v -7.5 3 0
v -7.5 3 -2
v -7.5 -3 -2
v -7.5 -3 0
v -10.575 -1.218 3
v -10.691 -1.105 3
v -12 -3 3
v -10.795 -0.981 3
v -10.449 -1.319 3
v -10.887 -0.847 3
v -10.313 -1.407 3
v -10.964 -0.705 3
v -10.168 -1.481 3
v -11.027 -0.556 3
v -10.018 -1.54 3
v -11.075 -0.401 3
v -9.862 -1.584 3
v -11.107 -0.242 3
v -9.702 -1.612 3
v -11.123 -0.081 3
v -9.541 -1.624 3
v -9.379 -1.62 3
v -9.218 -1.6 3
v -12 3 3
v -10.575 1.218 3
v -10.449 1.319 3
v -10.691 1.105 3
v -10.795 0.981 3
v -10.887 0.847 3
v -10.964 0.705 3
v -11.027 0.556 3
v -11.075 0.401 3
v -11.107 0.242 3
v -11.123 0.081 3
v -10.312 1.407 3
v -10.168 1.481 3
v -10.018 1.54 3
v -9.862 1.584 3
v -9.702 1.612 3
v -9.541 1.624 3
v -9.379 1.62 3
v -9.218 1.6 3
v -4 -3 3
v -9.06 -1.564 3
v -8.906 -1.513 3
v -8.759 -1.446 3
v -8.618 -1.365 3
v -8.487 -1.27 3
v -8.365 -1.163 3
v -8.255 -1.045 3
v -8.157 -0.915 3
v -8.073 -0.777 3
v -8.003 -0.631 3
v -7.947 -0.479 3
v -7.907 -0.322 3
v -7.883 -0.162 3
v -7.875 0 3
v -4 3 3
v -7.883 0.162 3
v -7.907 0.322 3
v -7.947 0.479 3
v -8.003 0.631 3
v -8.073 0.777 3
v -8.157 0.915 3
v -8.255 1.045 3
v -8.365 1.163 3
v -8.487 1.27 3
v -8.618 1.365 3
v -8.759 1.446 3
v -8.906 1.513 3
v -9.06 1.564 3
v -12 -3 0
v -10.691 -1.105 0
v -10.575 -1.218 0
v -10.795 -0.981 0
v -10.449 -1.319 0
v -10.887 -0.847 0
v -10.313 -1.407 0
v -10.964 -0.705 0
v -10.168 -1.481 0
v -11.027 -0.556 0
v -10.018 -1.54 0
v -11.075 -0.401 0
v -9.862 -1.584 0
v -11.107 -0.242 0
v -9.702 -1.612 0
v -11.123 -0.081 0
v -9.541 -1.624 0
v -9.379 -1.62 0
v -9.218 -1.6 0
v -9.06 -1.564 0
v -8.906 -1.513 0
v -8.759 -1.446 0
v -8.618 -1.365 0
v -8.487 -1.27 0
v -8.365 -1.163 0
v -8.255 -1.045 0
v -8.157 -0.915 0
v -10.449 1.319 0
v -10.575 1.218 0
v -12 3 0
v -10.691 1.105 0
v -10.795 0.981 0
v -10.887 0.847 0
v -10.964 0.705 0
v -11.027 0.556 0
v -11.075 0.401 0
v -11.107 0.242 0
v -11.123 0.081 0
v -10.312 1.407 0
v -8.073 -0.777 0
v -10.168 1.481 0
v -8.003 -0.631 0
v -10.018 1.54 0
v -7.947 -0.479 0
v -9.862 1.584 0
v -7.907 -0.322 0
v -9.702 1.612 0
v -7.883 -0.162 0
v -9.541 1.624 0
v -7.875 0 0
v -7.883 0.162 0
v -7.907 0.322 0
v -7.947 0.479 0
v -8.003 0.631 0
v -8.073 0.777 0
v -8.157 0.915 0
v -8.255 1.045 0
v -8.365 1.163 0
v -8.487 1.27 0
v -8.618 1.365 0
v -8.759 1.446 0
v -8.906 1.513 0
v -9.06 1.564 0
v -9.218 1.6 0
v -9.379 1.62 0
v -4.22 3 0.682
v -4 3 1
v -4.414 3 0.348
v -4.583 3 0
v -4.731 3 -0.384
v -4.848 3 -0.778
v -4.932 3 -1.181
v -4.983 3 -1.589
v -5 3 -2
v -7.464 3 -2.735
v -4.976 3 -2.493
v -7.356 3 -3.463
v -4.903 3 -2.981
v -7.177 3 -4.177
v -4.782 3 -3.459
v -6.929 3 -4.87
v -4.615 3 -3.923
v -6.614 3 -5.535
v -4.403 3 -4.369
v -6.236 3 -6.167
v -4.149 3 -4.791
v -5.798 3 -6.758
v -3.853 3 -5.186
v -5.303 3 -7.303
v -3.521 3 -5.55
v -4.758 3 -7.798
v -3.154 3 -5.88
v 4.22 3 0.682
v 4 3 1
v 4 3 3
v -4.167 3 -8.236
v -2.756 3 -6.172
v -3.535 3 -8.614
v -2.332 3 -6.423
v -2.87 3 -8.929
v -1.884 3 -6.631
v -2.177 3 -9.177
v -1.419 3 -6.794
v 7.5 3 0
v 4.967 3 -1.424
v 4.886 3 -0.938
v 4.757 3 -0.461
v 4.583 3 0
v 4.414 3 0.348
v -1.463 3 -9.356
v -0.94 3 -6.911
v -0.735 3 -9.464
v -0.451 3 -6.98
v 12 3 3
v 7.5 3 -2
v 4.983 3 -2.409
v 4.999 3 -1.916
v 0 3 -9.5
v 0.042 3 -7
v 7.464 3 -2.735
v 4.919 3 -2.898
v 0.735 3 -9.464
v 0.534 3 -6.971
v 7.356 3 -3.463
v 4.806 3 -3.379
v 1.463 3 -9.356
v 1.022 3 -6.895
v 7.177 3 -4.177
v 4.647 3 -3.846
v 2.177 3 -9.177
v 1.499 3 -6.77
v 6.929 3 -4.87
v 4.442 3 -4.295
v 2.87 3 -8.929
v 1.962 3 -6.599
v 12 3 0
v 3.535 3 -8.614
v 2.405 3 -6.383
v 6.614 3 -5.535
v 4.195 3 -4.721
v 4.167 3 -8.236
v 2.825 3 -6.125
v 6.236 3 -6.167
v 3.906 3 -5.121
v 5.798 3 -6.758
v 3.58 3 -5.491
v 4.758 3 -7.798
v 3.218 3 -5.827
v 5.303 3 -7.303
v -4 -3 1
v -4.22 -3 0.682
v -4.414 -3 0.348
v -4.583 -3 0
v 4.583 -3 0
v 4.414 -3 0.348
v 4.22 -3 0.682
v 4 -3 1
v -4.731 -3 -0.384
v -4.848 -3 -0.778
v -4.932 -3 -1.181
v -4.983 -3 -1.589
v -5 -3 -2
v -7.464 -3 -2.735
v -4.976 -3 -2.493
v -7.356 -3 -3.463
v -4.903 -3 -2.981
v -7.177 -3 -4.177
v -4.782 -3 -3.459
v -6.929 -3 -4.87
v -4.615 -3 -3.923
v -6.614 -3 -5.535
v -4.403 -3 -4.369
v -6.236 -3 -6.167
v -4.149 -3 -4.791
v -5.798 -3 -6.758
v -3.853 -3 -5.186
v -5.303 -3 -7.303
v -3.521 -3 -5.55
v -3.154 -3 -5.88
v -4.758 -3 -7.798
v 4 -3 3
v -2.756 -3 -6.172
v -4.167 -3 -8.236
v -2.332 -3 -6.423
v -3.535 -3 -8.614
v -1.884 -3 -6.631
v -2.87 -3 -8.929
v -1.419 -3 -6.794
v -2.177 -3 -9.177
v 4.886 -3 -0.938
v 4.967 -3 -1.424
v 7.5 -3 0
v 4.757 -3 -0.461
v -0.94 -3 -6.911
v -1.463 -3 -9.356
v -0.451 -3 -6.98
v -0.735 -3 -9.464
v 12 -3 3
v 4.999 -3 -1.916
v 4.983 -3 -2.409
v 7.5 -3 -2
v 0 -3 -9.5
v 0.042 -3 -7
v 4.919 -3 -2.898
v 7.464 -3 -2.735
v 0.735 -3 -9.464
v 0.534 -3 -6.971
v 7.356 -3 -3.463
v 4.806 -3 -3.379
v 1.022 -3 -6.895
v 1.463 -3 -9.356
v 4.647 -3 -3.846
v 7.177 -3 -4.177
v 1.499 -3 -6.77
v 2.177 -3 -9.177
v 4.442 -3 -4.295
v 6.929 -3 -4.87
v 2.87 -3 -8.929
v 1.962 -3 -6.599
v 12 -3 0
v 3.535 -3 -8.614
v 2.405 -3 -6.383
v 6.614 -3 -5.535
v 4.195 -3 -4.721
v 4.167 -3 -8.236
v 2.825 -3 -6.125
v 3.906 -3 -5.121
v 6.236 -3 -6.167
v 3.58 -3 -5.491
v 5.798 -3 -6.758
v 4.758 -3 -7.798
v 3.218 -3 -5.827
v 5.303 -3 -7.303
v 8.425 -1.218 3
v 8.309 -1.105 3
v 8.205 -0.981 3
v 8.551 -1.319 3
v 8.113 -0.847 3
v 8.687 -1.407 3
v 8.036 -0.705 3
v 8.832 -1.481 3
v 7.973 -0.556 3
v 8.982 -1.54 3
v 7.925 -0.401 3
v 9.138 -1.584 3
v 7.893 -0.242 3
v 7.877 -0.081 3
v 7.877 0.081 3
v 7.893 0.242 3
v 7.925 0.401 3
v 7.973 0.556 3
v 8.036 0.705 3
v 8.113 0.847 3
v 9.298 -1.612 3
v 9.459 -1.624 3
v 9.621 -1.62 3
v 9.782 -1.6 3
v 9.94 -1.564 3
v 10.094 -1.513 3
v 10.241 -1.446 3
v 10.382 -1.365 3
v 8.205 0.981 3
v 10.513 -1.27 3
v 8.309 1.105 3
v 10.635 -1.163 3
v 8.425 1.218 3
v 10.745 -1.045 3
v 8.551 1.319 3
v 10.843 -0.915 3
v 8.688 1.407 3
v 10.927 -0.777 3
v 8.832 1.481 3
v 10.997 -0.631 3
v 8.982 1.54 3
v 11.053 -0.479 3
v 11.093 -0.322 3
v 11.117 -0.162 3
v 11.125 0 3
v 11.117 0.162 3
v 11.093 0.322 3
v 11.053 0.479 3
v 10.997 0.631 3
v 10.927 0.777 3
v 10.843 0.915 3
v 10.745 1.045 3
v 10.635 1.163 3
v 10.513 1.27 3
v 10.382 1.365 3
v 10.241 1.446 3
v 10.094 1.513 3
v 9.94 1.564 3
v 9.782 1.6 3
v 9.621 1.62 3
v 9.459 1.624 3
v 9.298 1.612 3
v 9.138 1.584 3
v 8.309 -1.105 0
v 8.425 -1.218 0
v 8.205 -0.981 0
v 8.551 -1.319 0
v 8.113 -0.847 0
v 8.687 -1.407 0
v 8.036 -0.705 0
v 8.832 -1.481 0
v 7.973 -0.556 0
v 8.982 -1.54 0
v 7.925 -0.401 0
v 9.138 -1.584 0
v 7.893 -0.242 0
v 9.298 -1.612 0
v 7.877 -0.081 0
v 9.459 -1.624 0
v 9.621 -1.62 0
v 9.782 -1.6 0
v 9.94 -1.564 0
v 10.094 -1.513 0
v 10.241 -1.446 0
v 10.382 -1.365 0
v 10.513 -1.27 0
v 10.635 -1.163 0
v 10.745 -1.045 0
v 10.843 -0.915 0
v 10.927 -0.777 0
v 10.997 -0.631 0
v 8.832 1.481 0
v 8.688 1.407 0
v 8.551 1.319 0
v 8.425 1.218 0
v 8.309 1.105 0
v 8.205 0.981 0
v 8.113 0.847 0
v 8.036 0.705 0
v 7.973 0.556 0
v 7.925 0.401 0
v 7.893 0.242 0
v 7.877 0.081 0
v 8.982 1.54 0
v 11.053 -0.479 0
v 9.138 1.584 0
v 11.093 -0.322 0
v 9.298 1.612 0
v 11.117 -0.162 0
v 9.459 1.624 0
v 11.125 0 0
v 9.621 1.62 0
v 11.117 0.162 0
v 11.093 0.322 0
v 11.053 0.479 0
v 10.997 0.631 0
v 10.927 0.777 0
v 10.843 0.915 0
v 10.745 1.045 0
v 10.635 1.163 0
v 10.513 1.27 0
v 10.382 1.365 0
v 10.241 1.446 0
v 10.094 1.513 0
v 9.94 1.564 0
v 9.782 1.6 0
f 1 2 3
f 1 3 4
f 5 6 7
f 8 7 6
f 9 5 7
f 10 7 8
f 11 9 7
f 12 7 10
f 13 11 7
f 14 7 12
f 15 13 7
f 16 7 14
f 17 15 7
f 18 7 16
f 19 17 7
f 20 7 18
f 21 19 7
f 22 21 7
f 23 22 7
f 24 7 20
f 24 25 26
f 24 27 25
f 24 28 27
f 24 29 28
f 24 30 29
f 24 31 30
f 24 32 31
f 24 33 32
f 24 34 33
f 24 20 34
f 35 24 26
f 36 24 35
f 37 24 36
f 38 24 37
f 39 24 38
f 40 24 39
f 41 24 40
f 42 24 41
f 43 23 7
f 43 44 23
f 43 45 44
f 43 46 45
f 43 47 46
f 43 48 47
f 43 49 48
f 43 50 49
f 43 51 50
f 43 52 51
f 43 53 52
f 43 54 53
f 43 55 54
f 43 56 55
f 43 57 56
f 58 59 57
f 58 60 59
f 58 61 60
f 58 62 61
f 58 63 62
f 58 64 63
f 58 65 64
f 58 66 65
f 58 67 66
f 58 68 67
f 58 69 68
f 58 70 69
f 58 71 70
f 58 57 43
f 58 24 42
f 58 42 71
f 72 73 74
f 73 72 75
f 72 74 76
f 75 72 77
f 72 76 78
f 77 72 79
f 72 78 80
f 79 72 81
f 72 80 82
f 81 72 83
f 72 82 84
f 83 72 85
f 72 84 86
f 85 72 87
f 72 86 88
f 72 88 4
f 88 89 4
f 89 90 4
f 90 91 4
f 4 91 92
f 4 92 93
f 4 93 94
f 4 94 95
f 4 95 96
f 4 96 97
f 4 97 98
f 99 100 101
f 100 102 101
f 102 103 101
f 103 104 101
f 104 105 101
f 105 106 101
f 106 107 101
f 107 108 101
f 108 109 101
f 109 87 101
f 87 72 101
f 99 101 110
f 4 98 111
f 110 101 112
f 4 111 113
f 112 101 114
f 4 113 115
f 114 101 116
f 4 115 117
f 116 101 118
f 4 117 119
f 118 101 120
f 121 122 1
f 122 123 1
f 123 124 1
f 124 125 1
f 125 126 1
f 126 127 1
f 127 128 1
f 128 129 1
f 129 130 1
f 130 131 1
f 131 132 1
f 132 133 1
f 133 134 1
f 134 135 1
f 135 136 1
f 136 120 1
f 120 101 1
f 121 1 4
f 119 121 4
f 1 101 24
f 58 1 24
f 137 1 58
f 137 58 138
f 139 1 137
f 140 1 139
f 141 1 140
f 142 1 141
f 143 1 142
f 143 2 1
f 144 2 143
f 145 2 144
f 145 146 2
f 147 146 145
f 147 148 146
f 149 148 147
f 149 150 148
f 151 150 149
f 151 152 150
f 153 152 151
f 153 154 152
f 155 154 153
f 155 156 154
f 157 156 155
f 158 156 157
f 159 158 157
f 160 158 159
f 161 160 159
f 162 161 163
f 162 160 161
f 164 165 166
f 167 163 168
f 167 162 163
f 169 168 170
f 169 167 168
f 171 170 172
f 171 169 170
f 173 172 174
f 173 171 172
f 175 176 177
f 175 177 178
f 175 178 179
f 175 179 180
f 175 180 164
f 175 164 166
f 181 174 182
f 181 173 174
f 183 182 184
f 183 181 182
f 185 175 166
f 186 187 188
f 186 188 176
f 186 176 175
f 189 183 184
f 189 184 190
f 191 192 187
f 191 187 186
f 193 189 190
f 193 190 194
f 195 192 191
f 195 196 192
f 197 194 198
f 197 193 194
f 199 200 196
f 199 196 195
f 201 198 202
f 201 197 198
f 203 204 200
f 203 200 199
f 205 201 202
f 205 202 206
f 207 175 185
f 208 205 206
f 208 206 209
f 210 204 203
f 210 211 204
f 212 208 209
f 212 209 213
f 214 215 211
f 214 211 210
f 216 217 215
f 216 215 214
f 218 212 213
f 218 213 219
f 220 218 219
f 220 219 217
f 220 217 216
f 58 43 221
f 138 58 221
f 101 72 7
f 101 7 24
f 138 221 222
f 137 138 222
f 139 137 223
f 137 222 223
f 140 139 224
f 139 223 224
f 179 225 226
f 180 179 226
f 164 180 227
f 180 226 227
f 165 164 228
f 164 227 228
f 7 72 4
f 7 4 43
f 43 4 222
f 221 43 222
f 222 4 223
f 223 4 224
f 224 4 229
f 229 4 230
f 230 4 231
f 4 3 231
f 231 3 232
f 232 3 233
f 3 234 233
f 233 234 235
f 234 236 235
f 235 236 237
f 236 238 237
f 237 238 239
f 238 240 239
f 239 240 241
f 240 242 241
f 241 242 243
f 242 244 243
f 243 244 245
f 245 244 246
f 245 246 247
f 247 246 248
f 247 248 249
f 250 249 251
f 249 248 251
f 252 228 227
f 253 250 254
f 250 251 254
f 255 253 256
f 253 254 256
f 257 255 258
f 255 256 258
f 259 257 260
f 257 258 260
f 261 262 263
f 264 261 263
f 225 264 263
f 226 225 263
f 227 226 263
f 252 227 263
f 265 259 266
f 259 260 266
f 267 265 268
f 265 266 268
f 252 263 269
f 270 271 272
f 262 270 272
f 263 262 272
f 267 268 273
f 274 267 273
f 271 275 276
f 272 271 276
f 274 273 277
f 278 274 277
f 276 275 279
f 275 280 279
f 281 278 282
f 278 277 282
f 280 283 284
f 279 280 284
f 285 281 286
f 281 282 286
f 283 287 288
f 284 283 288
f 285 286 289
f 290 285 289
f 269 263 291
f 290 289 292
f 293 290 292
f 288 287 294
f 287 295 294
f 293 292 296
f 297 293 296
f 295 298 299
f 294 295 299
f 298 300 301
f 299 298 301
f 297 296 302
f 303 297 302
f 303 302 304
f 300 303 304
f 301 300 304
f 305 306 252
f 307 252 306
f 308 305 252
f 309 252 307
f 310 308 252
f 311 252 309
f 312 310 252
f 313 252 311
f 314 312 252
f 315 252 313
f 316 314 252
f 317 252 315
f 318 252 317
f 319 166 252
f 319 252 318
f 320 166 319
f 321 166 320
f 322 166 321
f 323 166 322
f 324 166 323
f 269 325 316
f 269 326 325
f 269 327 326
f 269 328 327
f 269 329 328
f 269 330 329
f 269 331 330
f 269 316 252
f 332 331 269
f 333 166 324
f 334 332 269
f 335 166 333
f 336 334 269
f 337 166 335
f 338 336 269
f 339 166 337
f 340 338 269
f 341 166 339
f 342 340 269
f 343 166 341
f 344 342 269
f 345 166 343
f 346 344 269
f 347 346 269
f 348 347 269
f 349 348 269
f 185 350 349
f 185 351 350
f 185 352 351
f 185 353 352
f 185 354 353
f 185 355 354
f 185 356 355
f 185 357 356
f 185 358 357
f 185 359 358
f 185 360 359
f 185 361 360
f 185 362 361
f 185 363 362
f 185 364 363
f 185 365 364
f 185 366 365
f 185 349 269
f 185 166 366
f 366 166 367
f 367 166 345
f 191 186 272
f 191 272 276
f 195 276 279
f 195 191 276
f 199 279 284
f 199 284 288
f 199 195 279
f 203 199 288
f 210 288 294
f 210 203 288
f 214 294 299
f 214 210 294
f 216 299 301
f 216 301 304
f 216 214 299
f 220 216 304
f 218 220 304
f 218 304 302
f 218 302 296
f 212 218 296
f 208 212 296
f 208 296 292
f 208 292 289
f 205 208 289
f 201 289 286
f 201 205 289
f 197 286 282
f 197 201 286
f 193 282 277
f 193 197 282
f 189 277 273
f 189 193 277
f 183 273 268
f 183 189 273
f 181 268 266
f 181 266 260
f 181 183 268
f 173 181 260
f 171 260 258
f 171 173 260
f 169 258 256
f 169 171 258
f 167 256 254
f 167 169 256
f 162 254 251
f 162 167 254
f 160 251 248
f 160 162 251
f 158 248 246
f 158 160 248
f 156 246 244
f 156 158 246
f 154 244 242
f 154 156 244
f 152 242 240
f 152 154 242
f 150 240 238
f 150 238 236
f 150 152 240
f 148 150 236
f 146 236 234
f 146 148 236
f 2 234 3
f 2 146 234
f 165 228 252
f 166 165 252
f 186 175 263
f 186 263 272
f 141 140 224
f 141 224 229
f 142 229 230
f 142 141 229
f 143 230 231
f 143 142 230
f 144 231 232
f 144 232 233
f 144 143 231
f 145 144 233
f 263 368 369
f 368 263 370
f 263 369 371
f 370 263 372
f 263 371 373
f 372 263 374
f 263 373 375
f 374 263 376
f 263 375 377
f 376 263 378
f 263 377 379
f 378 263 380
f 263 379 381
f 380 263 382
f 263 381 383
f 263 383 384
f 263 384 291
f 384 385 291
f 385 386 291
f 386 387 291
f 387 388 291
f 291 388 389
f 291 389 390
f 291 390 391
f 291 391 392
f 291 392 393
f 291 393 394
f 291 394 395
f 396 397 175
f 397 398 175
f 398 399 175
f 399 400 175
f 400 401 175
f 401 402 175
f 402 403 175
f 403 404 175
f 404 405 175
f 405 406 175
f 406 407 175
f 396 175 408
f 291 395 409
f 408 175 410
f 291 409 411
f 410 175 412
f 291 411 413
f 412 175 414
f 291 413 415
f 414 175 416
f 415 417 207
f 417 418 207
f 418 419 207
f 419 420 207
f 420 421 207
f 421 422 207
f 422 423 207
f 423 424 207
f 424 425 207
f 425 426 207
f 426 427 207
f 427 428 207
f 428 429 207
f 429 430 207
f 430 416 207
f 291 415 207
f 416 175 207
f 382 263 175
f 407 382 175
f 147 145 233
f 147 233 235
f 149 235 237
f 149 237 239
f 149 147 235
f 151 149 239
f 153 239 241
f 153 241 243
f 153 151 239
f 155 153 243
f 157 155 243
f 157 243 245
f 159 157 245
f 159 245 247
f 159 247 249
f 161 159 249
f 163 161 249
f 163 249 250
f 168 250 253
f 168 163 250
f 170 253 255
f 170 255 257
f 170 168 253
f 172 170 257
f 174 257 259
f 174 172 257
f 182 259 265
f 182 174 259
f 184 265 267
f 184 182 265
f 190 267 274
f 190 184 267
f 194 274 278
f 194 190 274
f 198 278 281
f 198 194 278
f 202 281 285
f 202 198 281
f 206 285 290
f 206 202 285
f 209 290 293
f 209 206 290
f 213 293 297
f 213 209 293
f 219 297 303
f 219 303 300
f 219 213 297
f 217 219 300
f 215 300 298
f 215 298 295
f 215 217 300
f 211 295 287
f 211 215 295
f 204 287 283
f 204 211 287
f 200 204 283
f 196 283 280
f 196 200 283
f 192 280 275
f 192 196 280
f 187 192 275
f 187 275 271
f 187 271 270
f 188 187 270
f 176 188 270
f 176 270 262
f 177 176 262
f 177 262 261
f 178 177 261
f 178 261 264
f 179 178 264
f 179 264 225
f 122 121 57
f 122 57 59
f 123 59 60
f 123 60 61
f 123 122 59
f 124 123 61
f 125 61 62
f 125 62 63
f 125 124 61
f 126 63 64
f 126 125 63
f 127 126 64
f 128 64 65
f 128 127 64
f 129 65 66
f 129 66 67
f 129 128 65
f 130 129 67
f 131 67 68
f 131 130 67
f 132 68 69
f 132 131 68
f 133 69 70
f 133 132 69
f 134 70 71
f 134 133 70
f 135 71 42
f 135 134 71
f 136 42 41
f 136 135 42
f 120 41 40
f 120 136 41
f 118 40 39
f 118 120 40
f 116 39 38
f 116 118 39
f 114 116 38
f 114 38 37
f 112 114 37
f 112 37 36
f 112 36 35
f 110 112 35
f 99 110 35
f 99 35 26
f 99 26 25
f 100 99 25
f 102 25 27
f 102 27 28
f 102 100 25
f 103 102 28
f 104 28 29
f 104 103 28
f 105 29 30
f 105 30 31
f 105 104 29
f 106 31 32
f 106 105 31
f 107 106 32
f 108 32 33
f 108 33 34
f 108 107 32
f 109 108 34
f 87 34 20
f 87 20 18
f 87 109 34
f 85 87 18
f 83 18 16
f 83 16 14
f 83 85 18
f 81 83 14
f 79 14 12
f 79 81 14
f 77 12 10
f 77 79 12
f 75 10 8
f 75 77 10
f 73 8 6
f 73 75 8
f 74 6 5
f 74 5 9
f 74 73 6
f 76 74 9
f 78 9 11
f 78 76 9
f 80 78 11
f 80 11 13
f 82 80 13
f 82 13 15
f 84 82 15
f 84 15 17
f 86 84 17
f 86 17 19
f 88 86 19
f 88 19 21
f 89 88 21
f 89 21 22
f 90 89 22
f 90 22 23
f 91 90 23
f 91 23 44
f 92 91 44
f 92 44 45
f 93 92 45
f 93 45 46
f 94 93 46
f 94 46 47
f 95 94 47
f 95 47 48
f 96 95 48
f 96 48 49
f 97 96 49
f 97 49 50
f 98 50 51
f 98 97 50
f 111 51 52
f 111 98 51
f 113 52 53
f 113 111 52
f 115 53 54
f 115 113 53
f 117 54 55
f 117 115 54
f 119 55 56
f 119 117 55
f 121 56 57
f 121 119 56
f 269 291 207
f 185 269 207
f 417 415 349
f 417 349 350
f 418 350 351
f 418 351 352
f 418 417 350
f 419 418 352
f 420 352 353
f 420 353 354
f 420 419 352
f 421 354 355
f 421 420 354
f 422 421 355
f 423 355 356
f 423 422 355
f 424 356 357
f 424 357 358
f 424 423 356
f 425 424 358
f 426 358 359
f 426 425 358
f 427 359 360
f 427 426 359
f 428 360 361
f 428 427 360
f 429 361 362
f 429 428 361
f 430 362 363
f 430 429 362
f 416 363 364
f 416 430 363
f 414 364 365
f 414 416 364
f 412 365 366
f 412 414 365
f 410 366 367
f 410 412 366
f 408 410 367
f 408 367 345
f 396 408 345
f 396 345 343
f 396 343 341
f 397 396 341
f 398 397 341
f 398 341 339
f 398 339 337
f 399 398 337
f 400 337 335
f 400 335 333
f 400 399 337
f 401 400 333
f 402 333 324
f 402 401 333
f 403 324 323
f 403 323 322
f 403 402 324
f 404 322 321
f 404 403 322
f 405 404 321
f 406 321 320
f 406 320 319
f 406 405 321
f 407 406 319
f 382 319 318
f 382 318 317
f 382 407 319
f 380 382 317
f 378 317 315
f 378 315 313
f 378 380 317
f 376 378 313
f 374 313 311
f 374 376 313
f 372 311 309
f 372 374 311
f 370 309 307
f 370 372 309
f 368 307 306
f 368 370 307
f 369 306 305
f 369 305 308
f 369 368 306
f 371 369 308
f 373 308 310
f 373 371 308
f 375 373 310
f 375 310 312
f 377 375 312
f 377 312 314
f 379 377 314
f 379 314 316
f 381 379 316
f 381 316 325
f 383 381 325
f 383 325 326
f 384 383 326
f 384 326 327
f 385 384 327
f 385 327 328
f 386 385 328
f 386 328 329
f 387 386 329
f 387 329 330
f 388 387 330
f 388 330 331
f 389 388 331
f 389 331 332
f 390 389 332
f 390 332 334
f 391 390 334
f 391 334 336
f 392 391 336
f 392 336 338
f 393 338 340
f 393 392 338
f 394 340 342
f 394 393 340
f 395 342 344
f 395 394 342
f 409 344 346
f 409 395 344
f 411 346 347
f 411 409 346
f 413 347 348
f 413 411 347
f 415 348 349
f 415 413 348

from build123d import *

# Parameters (mm, degrees)
F0_W     = 24
F0_H     = 6
F0_R     = 1.625
F1_DEPTH = 3
F3_DEPTH = 6
F5_DEPTH = 6.001


with BuildPart() as f1:
    # F0 (on Top) → F1 (new body)
    with BuildSketch(Plane.XY):
        Rectangle(F0_W, F0_H)
        with Locations((-9.5, 0)):
            Circle(F0_R, mode=Mode.SUBTRACT)
        with Locations((9.5, 0)):
            Circle(F0_R, mode=Mode.SUBTRACT)
    extrude(amount=F1_DEPTH)

    # F2 (on face) → F3 (join)
    with BuildSketch(Plane(origin=(0, 3, 0), x_dir=(-1, 0, 0), z_dir=(0, 1, 0))):
        with BuildLine():
            Line((-7.5, 0), (-7.5, -2))
            ThreePointArc((-7.5, -2), (0, -9.5), (7.5, -2))
            Line((7.5, -2), (7.5, 0))
            Line((7.5, 0), (4.582575695, 0))
            ThreePointArc((4.582575695, 0), (4.8945315647, -0.9784517816), (5, -2))
            ThreePointArc((5, -2), (-1.0215482184, -6.8945315647), (-4.582575695, 0))
            Line((-4.582575695, 0), (-7.5, 0))
        make_face()
    extrude(amount=-F3_DEPTH)

    # F4 (on face) → F5 (cut, through all)
    with BuildSketch(Plane.XZ.offset(3)):
        with BuildLine():
            Line((-4, 3), (-4, 1))
            ThreePointArc((-4, 1), (-2.2360679775, 2.472135955), (0, 3))
            Line((0, 3), (-4, 3))
        make_face()
        with BuildLine():
            Line((-4.582575695, 0), (-4, 0))
            Line((-4, 0), (-4, 1))
            ThreePointArc((-4, 1), (-4.3203184362, 0.5169125154), (-4.582575695, 0))
        make_face()
        with BuildLine():
            Line((-4, 1), (-4, 0))
            Line((-4, 0), (4, 0))
            Line((4, 0), (4, 1))
            ThreePointArc((4, 1), (2.2360679775, 2.472135955), (0, 3))
            ThreePointArc((0, 3), (-2.2360679775, 2.472135955), (-4, 1))
        make_face()
        with BuildLine():
            Line((4, 3), (0, 3))
            ThreePointArc((0, 3), (2.2360679775, 2.472135955), (4, 1))
            Line((4, 1), (4, 3))
        make_face()
        with BuildLine():
            Line((4, 1), (4, 0))
            Line((4, 0), (4.582575695, 0))
            ThreePointArc((4.582575695, 0), (4.3203184362, 0.5169125154), (4, 1))
        make_face()
    extrude(amount=-F5_DEPTH, mode=Mode.SUBTRACT)


solid = f1.part
